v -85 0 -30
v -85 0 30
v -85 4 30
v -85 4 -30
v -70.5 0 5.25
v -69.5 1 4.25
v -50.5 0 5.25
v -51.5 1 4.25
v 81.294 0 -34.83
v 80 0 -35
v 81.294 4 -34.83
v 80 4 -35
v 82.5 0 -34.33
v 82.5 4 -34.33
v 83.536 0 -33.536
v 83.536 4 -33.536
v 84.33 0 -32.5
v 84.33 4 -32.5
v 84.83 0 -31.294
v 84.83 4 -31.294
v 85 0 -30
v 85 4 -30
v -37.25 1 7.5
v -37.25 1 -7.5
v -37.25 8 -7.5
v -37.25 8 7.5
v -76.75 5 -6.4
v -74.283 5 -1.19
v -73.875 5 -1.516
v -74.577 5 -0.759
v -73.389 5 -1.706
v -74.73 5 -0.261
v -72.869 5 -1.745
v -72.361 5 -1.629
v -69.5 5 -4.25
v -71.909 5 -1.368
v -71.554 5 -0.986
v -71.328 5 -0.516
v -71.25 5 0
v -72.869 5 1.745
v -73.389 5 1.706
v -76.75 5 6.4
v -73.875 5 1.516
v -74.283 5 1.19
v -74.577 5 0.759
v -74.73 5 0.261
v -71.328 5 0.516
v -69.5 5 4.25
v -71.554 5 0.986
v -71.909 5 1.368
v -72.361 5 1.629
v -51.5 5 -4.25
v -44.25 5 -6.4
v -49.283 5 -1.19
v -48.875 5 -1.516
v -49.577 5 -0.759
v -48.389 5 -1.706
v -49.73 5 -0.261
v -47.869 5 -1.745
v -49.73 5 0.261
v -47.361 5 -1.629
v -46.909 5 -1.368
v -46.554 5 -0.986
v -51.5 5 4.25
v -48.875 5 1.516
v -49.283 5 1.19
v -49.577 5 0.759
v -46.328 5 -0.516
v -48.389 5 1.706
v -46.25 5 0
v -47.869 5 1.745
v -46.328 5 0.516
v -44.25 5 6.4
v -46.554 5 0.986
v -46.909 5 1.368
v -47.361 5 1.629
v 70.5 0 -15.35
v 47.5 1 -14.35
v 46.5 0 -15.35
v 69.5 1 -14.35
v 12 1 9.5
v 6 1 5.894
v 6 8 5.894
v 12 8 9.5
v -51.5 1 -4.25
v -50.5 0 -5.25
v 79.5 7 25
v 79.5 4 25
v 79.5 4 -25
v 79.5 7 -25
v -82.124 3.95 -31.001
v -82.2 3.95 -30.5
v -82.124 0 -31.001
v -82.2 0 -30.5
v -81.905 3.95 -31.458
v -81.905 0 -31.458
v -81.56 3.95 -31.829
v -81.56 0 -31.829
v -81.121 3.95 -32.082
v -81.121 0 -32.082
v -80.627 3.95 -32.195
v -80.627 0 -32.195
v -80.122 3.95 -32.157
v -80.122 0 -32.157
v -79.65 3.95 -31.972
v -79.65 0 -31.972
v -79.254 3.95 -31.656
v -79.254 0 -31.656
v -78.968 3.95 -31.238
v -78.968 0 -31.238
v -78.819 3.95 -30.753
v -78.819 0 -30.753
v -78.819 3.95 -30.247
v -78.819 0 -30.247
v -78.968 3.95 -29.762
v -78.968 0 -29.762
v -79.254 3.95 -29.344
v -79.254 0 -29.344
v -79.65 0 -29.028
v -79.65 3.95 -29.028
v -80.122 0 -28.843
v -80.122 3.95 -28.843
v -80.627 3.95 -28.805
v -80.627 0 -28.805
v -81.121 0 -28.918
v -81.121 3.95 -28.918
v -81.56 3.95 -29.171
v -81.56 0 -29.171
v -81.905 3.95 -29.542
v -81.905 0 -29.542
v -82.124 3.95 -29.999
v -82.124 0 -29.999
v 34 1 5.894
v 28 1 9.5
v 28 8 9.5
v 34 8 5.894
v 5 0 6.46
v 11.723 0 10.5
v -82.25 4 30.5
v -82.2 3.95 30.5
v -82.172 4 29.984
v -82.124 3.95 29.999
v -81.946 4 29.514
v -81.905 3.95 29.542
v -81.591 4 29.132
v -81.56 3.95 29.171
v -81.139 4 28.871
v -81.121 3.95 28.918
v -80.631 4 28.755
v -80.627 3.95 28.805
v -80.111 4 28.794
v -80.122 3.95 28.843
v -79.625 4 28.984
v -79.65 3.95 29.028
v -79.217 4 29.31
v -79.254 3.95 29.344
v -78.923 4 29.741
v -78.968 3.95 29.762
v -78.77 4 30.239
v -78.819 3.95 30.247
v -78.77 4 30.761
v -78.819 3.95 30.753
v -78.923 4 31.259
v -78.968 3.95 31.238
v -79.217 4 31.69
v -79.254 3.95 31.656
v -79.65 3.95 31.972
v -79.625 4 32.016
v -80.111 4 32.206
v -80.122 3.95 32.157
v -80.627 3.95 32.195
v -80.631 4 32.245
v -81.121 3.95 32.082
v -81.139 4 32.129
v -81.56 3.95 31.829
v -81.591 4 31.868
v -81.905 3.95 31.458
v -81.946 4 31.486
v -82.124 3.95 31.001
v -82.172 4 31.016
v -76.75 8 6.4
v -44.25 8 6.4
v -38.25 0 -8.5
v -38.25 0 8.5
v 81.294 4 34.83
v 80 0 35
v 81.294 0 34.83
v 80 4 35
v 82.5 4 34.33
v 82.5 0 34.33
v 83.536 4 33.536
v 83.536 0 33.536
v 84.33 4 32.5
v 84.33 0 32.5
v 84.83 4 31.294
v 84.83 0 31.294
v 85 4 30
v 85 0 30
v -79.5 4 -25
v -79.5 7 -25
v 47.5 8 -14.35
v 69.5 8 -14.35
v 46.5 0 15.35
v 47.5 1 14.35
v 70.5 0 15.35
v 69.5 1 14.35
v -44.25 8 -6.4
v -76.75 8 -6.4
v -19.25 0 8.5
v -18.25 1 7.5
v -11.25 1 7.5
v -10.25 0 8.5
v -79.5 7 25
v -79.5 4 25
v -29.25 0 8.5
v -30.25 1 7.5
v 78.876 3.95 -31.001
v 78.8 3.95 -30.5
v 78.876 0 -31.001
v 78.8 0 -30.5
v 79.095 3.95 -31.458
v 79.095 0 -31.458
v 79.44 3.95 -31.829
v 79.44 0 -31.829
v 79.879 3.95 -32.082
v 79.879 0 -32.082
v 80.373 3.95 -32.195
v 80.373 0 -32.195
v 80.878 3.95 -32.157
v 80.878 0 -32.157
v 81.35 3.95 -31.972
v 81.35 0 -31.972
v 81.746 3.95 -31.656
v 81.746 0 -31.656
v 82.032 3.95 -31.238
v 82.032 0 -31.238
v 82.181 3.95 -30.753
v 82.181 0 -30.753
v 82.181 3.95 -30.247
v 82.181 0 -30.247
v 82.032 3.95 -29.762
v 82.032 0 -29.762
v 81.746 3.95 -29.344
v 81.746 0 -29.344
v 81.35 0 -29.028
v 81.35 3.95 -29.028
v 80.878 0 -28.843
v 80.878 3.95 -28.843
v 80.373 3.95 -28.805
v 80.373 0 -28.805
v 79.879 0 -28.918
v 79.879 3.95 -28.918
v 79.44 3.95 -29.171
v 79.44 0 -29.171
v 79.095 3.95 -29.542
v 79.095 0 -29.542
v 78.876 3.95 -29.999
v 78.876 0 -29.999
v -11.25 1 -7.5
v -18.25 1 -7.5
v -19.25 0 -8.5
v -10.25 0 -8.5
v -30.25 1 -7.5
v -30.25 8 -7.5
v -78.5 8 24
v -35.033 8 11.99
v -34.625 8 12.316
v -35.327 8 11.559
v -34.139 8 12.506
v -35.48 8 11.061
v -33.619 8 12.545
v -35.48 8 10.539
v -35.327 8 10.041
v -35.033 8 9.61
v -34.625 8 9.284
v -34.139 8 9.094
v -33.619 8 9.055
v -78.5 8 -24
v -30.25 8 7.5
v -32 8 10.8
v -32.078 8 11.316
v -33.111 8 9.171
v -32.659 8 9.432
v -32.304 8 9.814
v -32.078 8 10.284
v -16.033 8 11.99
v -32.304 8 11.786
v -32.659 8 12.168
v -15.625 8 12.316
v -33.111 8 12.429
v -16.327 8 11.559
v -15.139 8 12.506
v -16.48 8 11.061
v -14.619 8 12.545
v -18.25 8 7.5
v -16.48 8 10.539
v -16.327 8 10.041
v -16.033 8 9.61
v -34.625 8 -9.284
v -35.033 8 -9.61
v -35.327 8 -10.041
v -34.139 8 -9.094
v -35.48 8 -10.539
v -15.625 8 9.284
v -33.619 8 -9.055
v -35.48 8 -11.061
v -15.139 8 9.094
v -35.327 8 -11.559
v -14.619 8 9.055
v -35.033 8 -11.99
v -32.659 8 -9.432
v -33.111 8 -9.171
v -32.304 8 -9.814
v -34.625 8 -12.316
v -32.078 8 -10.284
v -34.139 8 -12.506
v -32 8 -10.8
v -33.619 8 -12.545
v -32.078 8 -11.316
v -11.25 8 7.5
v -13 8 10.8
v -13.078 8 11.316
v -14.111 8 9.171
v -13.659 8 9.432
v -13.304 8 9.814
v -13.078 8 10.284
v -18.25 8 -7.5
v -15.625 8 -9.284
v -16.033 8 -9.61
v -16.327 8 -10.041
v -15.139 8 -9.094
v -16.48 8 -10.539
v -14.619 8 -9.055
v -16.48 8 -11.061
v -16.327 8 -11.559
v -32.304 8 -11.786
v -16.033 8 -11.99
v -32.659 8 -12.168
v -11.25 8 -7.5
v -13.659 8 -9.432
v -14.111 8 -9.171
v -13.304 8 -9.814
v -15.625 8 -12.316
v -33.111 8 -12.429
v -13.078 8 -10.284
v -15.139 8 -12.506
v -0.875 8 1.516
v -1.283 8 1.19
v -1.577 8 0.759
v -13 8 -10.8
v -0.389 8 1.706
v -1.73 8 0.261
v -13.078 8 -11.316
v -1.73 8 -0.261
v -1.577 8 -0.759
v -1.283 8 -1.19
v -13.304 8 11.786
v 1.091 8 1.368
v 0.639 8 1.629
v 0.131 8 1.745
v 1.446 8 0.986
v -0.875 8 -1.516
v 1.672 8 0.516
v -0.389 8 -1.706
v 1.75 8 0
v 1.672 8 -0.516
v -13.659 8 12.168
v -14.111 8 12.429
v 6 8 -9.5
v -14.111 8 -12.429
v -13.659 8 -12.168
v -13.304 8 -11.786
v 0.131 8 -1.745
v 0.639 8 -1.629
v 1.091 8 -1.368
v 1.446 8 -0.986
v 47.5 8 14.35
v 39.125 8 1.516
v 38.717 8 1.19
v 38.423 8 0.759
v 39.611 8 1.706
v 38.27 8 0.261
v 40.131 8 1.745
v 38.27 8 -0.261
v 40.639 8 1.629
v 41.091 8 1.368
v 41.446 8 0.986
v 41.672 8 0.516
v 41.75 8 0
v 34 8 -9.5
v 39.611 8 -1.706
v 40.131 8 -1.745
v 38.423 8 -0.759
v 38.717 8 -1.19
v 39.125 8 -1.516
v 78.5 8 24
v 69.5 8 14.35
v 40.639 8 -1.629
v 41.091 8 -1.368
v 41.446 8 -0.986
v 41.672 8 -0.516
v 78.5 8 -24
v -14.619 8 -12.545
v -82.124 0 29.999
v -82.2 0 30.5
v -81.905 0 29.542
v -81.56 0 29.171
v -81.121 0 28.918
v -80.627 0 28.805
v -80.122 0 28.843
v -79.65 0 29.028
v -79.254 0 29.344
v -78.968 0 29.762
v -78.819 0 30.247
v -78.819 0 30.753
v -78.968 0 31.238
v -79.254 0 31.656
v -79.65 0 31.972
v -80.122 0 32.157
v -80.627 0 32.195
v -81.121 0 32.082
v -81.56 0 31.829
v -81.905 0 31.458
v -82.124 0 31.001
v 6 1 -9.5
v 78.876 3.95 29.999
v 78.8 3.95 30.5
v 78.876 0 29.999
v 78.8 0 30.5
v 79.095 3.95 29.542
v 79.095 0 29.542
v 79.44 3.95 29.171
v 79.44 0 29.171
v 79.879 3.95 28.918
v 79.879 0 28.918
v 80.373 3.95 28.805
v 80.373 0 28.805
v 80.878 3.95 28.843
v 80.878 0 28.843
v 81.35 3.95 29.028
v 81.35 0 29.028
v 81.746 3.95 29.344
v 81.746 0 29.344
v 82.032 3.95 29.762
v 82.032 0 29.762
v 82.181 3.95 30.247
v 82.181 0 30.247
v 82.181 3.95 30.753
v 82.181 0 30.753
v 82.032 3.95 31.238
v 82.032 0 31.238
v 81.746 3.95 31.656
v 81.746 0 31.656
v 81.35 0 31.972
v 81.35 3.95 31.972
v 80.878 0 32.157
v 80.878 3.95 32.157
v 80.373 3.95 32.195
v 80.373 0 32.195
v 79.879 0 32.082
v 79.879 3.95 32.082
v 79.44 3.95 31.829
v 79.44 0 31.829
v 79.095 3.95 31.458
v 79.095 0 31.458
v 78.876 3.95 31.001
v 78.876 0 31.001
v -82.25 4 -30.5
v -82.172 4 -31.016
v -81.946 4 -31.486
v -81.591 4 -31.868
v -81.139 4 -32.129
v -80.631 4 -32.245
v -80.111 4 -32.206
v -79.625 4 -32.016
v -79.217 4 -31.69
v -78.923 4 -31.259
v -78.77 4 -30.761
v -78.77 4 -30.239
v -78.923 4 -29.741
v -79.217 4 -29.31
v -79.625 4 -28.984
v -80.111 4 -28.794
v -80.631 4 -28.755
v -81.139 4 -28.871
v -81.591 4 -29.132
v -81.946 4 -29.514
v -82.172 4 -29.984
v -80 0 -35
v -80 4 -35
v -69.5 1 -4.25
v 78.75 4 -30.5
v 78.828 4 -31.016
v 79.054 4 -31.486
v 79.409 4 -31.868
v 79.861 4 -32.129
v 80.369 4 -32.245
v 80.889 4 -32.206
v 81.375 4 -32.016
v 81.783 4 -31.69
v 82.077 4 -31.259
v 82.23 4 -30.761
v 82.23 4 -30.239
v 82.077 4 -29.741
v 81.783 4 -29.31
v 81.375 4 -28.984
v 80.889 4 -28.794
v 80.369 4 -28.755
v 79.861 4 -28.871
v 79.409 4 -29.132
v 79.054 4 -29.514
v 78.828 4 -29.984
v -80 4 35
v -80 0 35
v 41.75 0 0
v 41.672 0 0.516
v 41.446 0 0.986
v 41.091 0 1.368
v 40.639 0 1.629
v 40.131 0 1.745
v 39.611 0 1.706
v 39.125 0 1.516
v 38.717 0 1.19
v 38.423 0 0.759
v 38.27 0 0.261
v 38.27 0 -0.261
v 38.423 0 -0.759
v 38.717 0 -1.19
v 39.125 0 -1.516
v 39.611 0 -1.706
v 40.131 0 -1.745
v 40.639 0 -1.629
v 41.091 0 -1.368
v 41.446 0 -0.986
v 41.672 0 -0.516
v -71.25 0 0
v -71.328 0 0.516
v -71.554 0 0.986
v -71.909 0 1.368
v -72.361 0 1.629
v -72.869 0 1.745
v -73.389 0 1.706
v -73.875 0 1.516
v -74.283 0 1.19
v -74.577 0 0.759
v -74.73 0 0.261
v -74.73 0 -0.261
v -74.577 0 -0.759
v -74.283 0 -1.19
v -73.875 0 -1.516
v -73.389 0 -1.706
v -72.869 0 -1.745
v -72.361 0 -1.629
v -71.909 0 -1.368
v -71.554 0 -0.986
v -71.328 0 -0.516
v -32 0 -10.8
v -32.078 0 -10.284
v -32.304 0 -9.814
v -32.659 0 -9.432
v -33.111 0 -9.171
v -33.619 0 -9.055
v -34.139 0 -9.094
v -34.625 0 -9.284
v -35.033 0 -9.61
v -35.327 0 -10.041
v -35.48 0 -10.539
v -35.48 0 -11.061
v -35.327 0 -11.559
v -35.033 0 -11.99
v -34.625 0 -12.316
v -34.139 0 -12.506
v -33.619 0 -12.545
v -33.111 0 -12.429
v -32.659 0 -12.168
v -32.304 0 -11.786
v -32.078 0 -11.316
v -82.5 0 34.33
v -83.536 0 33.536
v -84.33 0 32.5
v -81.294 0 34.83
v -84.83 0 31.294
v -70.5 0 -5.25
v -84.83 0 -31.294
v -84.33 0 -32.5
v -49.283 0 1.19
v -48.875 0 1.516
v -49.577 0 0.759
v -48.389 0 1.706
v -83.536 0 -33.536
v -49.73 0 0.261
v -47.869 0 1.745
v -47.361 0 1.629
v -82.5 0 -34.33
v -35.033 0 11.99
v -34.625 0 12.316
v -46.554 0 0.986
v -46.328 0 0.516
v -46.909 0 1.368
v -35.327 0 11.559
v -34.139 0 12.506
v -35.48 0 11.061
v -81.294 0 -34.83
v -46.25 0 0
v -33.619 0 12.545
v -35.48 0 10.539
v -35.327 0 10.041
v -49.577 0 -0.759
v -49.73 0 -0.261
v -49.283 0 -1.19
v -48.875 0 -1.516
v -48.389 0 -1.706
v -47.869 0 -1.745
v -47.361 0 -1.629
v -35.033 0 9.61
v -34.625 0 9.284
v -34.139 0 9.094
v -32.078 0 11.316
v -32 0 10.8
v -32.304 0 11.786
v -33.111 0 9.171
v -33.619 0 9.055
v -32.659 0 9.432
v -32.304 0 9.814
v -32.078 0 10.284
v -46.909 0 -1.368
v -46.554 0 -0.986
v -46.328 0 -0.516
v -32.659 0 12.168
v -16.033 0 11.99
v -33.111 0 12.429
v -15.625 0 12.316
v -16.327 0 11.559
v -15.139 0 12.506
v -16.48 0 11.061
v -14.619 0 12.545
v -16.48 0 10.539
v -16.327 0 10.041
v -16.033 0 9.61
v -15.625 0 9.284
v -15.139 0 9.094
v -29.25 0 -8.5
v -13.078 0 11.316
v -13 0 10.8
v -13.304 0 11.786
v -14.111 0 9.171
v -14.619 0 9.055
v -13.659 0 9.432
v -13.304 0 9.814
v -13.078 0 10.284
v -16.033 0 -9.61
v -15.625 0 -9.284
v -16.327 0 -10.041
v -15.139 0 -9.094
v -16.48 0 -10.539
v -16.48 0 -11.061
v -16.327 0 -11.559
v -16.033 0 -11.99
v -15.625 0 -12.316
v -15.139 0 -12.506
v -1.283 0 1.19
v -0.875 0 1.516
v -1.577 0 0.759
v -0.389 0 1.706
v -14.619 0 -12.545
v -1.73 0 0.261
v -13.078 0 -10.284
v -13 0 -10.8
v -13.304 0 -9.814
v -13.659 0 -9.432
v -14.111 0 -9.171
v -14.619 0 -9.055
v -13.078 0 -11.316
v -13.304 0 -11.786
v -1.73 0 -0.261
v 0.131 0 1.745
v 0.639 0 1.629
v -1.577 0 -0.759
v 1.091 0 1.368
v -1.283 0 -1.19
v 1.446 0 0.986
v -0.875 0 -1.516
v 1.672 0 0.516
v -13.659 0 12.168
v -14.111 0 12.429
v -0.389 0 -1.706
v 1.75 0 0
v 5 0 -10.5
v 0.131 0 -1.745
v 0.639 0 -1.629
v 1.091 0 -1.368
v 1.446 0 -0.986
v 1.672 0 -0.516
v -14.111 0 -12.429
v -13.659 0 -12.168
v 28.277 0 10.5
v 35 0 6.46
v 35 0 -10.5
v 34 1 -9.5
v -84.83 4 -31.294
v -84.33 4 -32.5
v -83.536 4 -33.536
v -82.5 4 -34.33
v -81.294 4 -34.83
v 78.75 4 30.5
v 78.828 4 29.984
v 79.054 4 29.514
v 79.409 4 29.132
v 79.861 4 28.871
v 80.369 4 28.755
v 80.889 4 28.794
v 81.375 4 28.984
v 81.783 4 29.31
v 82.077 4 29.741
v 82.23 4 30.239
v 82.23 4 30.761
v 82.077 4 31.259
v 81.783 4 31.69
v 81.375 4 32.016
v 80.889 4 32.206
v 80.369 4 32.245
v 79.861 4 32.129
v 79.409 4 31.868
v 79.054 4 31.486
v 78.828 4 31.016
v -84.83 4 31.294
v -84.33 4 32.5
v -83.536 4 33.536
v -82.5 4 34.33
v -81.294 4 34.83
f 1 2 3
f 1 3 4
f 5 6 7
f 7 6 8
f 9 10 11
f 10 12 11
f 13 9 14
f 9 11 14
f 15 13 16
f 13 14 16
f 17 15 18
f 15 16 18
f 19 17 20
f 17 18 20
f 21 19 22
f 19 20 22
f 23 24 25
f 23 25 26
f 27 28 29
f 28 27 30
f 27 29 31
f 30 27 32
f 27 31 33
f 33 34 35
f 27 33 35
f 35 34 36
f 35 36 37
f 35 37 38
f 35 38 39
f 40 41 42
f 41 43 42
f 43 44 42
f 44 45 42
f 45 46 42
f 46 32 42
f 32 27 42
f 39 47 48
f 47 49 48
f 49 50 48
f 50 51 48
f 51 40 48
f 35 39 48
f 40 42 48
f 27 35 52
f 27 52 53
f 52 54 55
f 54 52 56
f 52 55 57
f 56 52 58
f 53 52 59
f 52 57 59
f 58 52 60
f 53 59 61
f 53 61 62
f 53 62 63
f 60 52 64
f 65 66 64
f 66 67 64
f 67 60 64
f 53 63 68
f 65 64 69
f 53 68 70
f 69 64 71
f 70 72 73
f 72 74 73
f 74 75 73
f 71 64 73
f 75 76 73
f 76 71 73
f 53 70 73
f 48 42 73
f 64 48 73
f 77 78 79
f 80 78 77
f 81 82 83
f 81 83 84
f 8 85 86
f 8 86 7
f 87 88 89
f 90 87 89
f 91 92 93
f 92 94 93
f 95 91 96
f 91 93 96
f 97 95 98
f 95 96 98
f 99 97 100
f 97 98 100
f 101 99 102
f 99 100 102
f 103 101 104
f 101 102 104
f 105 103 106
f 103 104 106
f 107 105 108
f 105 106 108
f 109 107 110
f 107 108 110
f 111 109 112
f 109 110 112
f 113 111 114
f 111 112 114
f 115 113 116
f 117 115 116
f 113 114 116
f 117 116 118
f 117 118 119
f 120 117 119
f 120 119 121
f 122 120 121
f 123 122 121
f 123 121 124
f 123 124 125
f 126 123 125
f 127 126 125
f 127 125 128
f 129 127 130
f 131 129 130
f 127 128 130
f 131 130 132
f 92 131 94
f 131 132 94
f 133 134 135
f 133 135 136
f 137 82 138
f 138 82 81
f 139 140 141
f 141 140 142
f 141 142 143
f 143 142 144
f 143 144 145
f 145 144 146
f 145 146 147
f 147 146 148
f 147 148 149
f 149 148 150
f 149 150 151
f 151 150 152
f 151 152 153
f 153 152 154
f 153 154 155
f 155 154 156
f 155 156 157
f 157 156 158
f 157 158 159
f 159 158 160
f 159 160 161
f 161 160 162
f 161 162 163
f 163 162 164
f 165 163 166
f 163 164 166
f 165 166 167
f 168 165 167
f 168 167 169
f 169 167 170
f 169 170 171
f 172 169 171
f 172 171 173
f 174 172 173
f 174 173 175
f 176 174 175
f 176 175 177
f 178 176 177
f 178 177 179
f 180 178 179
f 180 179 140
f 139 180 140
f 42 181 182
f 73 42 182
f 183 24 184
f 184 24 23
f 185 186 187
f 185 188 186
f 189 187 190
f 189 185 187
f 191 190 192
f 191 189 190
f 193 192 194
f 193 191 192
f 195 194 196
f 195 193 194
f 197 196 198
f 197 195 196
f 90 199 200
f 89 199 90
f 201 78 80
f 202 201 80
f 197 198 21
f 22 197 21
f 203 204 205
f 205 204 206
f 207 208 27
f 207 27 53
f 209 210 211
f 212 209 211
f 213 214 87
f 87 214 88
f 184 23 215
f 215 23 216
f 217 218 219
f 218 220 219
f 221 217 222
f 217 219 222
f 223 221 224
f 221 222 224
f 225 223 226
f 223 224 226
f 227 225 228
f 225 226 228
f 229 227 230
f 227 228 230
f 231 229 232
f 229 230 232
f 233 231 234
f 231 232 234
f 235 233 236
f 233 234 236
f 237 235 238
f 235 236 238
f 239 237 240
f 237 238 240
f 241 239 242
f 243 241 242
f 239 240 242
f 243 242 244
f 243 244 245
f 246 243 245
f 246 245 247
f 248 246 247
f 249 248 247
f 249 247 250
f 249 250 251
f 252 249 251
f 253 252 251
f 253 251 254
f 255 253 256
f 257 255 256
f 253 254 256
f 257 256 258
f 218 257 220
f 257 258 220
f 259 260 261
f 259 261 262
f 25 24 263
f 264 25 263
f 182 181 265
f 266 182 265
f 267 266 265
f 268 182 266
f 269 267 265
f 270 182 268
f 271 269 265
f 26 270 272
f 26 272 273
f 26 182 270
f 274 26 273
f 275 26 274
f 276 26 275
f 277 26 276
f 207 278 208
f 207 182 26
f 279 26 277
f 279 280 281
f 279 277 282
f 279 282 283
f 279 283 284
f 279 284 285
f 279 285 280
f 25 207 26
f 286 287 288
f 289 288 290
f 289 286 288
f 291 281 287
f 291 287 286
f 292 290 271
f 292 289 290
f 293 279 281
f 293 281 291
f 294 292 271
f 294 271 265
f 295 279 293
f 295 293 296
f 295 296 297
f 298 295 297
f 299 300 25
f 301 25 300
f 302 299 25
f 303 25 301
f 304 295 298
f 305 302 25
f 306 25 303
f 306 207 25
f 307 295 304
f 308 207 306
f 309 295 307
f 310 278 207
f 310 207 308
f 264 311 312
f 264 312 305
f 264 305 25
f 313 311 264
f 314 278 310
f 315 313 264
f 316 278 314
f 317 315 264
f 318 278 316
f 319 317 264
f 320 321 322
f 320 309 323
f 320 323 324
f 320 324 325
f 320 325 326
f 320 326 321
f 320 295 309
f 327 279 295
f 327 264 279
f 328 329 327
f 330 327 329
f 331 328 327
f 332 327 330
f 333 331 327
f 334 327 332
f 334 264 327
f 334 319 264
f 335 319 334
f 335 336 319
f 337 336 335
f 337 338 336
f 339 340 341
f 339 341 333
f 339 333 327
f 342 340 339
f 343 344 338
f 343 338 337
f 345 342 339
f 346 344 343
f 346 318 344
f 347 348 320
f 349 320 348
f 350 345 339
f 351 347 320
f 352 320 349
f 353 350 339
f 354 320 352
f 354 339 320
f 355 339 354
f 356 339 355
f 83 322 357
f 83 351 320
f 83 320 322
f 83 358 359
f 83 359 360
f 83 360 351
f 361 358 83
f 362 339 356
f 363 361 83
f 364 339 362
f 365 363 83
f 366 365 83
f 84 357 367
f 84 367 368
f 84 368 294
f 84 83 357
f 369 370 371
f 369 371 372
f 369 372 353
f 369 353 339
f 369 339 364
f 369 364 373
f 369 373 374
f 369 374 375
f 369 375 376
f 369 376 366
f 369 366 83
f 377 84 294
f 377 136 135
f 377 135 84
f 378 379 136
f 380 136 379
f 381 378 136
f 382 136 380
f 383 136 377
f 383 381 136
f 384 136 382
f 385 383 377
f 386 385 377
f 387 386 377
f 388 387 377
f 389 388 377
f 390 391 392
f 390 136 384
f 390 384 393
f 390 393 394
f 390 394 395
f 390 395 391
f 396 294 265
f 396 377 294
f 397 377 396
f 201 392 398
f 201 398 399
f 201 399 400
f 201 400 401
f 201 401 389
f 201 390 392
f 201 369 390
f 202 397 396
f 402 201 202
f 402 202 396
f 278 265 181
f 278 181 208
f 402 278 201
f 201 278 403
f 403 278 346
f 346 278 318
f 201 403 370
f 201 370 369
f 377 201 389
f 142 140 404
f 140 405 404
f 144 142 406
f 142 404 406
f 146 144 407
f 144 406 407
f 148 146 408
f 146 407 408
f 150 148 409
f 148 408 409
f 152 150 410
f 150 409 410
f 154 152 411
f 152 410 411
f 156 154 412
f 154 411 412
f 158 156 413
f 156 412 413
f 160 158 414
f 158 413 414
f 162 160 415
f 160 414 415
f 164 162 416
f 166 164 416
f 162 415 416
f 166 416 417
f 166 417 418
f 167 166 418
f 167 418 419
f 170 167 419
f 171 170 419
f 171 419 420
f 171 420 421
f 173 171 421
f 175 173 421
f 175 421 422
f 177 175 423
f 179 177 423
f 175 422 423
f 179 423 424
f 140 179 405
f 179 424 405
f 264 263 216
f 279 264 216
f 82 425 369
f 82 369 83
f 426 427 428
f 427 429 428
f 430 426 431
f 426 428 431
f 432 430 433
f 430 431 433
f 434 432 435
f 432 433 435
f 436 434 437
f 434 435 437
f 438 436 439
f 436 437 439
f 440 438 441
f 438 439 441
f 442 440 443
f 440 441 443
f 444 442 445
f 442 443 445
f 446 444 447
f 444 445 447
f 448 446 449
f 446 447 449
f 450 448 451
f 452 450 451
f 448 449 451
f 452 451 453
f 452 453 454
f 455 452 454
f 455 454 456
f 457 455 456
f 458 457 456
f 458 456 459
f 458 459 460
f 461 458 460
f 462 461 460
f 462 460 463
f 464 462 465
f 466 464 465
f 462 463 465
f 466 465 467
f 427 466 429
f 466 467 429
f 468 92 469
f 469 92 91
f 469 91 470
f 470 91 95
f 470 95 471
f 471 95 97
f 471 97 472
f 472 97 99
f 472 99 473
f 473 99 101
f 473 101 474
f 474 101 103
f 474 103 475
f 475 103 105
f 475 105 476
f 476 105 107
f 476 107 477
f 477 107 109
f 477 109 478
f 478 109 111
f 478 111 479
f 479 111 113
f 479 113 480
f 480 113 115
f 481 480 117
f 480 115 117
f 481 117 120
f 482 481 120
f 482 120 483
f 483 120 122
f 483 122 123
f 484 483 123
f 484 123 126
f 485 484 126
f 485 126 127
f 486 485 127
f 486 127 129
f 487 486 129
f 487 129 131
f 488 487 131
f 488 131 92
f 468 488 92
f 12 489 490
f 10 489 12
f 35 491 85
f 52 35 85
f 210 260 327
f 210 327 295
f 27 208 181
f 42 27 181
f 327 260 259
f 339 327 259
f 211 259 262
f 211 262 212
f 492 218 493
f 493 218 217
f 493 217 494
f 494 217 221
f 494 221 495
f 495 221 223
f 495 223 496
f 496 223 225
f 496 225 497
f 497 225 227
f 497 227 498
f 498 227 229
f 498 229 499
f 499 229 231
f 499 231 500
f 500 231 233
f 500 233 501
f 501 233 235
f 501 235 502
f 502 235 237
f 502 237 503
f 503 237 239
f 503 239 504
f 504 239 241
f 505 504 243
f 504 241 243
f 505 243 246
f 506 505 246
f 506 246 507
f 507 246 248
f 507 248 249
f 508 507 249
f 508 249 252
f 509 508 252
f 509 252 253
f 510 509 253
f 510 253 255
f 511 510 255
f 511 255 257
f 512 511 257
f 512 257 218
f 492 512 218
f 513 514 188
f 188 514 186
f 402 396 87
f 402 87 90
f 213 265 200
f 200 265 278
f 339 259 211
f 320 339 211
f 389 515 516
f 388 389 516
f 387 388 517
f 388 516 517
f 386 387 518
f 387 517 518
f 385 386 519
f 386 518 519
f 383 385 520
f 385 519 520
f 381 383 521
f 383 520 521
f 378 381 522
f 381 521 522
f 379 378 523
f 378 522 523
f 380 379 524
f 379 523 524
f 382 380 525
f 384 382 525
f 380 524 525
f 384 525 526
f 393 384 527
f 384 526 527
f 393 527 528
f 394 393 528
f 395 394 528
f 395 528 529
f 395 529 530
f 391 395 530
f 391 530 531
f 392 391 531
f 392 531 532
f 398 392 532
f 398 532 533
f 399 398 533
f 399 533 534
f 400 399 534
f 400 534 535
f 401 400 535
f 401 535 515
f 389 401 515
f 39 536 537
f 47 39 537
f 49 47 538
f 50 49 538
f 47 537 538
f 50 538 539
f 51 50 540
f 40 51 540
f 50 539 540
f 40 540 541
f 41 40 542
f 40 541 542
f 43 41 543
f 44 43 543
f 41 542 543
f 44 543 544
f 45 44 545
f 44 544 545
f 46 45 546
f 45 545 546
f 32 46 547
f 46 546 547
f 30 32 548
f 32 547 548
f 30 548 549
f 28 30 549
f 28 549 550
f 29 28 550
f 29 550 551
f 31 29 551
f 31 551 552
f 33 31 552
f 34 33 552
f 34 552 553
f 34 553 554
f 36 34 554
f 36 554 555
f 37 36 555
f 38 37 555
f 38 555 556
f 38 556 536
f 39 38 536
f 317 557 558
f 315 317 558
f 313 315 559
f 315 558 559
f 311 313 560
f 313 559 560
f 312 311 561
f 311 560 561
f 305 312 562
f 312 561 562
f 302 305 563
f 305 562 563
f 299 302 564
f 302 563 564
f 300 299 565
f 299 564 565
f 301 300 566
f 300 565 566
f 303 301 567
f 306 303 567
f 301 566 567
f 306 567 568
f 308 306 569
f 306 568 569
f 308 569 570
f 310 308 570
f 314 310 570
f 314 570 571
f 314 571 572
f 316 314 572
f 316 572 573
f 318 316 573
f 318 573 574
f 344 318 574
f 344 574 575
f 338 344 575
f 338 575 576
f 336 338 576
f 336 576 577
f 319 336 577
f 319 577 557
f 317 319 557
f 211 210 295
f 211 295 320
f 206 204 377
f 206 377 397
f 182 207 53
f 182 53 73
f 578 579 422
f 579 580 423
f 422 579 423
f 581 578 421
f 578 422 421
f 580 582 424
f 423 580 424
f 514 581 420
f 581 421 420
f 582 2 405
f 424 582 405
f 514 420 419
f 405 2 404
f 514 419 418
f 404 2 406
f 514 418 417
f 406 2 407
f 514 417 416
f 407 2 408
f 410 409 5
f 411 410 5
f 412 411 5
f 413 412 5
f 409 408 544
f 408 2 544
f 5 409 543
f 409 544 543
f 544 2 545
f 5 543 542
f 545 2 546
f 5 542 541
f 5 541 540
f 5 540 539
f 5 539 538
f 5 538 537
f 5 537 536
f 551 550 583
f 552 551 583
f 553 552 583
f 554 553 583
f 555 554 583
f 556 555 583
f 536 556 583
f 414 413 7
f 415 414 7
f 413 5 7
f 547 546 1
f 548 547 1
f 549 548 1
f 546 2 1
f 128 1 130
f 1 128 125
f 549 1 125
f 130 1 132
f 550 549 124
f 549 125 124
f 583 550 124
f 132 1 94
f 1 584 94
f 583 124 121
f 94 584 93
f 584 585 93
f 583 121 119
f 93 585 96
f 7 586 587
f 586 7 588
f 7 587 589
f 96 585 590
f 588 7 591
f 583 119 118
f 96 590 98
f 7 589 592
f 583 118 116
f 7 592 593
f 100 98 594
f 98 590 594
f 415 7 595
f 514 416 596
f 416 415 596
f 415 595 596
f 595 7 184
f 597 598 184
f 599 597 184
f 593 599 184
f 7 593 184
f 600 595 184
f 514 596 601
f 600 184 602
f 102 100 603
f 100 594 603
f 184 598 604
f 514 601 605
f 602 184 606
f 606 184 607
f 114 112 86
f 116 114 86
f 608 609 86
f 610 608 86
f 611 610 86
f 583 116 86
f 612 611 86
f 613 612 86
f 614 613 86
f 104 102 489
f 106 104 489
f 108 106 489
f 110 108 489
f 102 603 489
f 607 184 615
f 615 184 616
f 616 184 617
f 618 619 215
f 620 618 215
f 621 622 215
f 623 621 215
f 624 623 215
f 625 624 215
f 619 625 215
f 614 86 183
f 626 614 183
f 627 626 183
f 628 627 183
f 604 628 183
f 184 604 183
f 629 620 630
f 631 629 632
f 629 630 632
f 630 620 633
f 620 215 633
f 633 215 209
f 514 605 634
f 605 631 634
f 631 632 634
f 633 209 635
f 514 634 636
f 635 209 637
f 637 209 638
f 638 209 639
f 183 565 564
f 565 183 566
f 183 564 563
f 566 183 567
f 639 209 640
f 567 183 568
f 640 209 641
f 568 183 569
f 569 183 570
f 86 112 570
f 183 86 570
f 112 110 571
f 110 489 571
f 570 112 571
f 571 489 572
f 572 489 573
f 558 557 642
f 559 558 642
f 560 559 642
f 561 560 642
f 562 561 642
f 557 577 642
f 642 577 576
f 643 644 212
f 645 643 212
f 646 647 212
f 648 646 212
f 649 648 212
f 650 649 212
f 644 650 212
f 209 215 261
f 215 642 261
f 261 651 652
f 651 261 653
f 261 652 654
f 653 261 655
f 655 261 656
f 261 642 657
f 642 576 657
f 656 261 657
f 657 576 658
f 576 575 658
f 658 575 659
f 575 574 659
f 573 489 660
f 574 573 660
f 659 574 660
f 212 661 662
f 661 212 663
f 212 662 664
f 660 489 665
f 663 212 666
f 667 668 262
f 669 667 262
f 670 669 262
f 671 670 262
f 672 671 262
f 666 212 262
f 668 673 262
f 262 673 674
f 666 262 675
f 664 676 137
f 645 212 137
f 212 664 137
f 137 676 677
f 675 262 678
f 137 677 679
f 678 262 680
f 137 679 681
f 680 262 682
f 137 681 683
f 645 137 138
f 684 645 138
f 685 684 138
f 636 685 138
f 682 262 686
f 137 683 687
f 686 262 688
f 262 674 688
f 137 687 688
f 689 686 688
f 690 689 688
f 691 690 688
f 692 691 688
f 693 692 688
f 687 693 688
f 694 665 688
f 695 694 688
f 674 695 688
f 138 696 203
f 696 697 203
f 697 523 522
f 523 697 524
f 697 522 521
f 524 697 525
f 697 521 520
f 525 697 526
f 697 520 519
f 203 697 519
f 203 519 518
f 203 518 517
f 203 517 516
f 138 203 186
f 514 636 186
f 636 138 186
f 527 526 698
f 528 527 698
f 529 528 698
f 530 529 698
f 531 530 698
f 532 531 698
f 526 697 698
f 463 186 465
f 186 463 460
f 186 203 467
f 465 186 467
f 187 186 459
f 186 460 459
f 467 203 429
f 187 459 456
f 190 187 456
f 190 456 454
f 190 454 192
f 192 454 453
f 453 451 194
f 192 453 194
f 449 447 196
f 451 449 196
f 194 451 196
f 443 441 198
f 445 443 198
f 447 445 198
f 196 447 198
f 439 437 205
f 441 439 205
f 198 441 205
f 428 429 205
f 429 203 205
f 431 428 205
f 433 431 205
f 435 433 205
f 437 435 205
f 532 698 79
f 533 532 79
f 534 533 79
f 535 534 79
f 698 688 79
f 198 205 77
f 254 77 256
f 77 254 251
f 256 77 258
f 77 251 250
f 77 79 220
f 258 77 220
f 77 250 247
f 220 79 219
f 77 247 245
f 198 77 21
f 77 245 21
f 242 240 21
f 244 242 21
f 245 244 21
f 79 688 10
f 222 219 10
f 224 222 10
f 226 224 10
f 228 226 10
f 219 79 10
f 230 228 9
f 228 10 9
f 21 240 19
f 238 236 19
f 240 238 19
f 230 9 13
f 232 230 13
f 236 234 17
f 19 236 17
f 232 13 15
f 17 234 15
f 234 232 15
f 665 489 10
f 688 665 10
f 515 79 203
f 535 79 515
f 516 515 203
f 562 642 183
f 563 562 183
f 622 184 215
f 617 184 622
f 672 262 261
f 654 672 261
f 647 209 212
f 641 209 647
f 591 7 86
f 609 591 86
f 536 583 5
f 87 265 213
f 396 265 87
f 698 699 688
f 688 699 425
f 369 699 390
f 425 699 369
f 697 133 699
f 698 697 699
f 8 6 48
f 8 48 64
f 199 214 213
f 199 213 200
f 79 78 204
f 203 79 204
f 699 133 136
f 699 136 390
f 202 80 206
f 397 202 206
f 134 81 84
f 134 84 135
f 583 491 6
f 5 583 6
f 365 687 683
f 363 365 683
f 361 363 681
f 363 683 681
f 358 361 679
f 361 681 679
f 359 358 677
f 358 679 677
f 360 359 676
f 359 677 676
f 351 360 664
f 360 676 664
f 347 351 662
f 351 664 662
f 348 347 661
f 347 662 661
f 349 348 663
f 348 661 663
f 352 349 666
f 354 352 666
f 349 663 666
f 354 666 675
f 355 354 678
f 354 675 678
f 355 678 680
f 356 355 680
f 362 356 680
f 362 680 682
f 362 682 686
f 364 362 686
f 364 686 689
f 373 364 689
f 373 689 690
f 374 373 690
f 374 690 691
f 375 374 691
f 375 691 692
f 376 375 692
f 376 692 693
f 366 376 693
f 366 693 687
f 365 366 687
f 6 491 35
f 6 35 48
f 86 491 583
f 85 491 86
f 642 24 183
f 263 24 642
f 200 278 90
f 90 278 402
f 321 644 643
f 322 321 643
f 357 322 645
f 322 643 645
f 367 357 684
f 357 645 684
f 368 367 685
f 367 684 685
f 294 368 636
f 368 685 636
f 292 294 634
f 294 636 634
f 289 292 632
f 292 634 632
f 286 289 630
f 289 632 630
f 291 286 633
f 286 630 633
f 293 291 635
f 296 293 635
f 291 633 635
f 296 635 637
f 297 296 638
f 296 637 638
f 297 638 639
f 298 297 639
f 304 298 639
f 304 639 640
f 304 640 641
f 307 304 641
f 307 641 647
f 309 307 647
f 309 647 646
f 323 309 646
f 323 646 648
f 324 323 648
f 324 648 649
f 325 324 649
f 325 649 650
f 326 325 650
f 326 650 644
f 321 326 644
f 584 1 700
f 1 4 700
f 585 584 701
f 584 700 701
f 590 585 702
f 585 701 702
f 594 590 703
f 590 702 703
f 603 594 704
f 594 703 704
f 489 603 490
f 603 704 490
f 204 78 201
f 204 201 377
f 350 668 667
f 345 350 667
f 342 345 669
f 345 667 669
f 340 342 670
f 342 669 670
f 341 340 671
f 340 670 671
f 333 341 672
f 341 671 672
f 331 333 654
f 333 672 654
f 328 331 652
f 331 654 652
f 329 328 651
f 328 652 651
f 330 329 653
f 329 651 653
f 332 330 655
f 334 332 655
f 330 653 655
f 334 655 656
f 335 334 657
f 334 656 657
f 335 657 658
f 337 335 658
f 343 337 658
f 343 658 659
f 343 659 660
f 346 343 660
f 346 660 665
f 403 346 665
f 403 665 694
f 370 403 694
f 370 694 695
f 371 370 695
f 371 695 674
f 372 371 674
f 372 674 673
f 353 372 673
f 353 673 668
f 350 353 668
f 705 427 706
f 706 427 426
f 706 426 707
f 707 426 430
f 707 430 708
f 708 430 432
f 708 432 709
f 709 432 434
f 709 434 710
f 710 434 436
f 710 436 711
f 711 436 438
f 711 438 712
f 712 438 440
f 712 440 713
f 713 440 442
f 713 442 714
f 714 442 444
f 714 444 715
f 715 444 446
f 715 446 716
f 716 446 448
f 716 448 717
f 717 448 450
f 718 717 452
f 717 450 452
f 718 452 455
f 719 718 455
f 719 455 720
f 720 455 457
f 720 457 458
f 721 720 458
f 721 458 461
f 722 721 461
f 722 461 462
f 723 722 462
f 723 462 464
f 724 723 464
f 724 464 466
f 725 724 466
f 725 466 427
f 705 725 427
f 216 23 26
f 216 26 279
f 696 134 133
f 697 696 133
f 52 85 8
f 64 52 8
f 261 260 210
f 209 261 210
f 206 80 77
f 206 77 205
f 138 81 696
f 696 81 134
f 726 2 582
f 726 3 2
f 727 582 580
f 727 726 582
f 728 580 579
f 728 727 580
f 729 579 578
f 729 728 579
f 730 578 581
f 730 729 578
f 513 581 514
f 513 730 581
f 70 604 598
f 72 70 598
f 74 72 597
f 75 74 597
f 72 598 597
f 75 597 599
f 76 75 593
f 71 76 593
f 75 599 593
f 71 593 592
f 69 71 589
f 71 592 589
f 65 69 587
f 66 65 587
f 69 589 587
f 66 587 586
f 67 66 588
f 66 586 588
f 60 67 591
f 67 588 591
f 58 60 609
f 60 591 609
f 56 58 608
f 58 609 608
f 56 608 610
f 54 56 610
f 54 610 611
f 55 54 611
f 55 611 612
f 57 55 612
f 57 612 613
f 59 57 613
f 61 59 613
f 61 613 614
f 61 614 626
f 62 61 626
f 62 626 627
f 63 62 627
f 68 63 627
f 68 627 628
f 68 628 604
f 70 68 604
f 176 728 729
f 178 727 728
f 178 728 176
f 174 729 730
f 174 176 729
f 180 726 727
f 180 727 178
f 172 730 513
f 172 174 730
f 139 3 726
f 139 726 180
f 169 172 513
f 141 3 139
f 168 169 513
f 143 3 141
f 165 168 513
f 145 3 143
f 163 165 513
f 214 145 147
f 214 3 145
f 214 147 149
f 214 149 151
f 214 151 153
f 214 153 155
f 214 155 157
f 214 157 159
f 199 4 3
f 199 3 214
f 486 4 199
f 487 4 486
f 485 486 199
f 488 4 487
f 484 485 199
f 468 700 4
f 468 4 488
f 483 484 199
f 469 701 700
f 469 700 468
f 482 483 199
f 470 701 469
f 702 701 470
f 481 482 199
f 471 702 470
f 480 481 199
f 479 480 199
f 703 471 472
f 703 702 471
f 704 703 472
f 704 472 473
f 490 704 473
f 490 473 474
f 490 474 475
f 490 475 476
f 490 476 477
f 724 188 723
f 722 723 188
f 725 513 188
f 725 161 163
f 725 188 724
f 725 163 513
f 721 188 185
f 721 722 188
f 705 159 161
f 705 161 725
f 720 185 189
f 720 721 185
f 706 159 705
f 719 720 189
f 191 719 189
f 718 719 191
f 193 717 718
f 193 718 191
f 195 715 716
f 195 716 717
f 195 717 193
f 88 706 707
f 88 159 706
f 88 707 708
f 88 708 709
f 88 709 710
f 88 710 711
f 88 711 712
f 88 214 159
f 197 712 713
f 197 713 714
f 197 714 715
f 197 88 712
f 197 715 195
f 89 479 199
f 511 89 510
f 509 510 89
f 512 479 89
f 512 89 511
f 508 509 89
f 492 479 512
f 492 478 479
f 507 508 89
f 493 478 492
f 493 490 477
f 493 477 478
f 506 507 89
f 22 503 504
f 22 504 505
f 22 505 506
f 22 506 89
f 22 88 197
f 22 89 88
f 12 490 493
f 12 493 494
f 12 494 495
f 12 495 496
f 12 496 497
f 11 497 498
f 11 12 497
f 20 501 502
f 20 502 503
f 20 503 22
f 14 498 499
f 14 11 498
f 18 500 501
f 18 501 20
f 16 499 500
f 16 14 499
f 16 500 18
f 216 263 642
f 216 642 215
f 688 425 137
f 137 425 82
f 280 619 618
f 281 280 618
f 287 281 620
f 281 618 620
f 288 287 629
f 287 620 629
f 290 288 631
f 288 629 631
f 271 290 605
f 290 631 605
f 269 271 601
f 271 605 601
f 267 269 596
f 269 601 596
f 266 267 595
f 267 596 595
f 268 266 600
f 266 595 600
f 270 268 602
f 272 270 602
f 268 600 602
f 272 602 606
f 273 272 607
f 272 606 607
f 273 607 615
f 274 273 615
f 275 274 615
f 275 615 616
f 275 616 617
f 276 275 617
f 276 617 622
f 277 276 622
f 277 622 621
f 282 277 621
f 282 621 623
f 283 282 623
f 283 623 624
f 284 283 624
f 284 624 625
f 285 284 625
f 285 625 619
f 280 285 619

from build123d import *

# Parameters (mm, degrees)
SKETCH1_W                      = 170
SKETCH1_H                      = 70
BOSS_EXTRUDE1_DEPTH            = 4
SKETCH2_W                      = 159
SKETCH2_H                      = 50
BOSS_EXTRUDE2_DEPTH            = 4
M3_CLEARANCE_HOLE1_D           = 3.4
M3_CLEARANCE_HOLE1_CSINK_D     = 3.5
M3_CLEARANCE_HOLE1_CSINK_ANGLE = 90
SKETCH6_R                      = 1.75
SKETCH6_W                      = 18
SKETCH6_H                      = 8.5
SKETCH6_W_2                    = 22
SKETCH6_H_2                    = 28.7
SKETCH6_W_3                    = 7
SKETCH6_H_3                    = 15
CUT_EXTRUDE1_DEPTH             = 9
CUT_EXTRUDE2_START             = -8
SKETCH6_3_W                    = 18
SKETCH6_3_H                    = 8.5
SKETCH6_3_W_2                  = 32.5
SKETCH6_3_H_2                  = 12.8
CUT_EXTRUDE2_DEPTH             = 3
CHAMFER1_SIZE                  = 1
FILLET1_R                      = 5


with BuildPart() as part:
    # Sketch1 → Boss-Extrude1 (new body)
    with BuildSketch(Plane(origin=(0, 0, 0), x_dir=(1, 0, 0), z_dir=(0, 1, 0))):
        Rectangle(SKETCH1_W, SKETCH1_H)
    extrude(amount=BOSS_EXTRUDE1_DEPTH)

    # Sketch2 → Boss-Extrude2 (add)
    with BuildSketch(Plane(origin=(0, 4, 0), x_dir=(1, 0, 0), z_dir=(0, 1, 0))):
        Rectangle(SKETCH2_W, SKETCH2_H)
    extrude(amount=BOSS_EXTRUDE2_DEPTH)

    # M3 Clearance Hole1 (through all)
    with Locations(Plane(origin=(0, 4, 0), x_dir=(1, 0, 0), z_dir=(0, 1, 0))):
        with Locations((80.5, -30.5), (80.5, 30.5), (-80.5, -30.5), (-80.5, 30.5)):
            CounterSinkHole(M3_CLEARANCE_HOLE1_D / 2, M3_CLEARANCE_HOLE1_CSINK_D / 2, counter_sink_angle=M3_CLEARANCE_HOLE1_CSINK_ANGLE)

    # Sketch6 → Cut-Extrude1 (cut, through all)
    with BuildSketch(Plane.XZ):
        with Locations((-48, 0)):
            Circle(SKETCH6_R)
        with Locations((-73, 0)):
            Circle(SKETCH6_R)
        with Locations((-60.5, 0)):
            Rectangle(SKETCH6_W, SKETCH6_H)
        with Locations((-33.75, 10.8)):
            Circle(SKETCH6_R)
        with Locations((-33.75, -10.8)):
            Circle(SKETCH6_R)
        with Locations((-14.75, 10.8)):
            Circle(SKETCH6_R)
        with Locations((-14.75, -10.8)):
            Circle(SKETCH6_R)
        Circle(SKETCH6_R)
        with Locations((58.5, 0)):
            Rectangle(SKETCH6_W_2, SKETCH6_H_2)
        with Locations((-33.75, 0)):
            Rectangle(SKETCH6_W_3, SKETCH6_H_3)
        with Locations((-14.75, 0)):
            Rectangle(SKETCH6_W_3, SKETCH6_H_3)
        Polygon((28, 9.5), (34, 5.894448725), (34, -9.5), (6, -9.5), (6, 5.894448725), (12, 9.5), align=None)
        with Locations((40, 0)):
            Circle(SKETCH6_R)
    extrude(amount=-CUT_EXTRUDE1_DEPTH, mode=Mode.SUBTRACT)

    # Sketch6<3> → Cut-Extrude2 (cut)
    with BuildSketch(Plane.XZ.offset(CUT_EXTRUDE2_START)):
        with Locations((-60.5, 0)):
            Rectangle(SKETCH6_3_W, SKETCH6_3_H)
        with Locations((-60.5, 0)):
            Rectangle(SKETCH6_3_W_2, SKETCH6_3_H_2)
    extrude(amount=CUT_EXTRUDE2_DEPTH, mode=Mode.SUBTRACT)

    # Chamfer1
    chamfer1_edges = [part.edges().sort_by_distance(p)[0] for p in [
        (69.5, 0, 0),
        (58.5, 0, 14.35),
        (47.5, 0, 0),
        (58.5, 0, -14.35),
        (-37.25, 0, 0),
        (-33.75, 0, 7.5),
        (-33.75, 0, -7.5),
        (-30.25, 0, 0),
        (-18.25, 0, 0),
        (-14.75, 0, 7.5),
        (-14.75, 0, -7.5),
        (-11.25, 0, 0),
        (20, 0, 9.5),
        (31, 0, 7.697224362),
        (34, 0, -1.802775638),
        (20, 0, -9.5),
        (9, 0, 7.697224362),
        (6, 0, -1.802775638),
        (-79.5, 8, 0),
        (0, 8, -25),
        (0, 8, 25),
        (79.5, 8, 0),
        (-51.5, 0, 0),
        (-60.5, 0, 4.25),
        (-69.5, 0, 0),
        (-60.5, 0, -4.25),
    ]]
    chamfer(chamfer1_edges, length=CHAMFER1_SIZE)

    # Fillet1
    fillet1_edges = [part.edges().sort_by_distance(p)[0] for p in [
        (85, 2, 35),
        (-85, 2, 35),
        (-85, 2, -35),
        (85, 2, -35),
    ]]
    fillet(fillet1_edges, radius=FILLET1_R)


solid = part.part
